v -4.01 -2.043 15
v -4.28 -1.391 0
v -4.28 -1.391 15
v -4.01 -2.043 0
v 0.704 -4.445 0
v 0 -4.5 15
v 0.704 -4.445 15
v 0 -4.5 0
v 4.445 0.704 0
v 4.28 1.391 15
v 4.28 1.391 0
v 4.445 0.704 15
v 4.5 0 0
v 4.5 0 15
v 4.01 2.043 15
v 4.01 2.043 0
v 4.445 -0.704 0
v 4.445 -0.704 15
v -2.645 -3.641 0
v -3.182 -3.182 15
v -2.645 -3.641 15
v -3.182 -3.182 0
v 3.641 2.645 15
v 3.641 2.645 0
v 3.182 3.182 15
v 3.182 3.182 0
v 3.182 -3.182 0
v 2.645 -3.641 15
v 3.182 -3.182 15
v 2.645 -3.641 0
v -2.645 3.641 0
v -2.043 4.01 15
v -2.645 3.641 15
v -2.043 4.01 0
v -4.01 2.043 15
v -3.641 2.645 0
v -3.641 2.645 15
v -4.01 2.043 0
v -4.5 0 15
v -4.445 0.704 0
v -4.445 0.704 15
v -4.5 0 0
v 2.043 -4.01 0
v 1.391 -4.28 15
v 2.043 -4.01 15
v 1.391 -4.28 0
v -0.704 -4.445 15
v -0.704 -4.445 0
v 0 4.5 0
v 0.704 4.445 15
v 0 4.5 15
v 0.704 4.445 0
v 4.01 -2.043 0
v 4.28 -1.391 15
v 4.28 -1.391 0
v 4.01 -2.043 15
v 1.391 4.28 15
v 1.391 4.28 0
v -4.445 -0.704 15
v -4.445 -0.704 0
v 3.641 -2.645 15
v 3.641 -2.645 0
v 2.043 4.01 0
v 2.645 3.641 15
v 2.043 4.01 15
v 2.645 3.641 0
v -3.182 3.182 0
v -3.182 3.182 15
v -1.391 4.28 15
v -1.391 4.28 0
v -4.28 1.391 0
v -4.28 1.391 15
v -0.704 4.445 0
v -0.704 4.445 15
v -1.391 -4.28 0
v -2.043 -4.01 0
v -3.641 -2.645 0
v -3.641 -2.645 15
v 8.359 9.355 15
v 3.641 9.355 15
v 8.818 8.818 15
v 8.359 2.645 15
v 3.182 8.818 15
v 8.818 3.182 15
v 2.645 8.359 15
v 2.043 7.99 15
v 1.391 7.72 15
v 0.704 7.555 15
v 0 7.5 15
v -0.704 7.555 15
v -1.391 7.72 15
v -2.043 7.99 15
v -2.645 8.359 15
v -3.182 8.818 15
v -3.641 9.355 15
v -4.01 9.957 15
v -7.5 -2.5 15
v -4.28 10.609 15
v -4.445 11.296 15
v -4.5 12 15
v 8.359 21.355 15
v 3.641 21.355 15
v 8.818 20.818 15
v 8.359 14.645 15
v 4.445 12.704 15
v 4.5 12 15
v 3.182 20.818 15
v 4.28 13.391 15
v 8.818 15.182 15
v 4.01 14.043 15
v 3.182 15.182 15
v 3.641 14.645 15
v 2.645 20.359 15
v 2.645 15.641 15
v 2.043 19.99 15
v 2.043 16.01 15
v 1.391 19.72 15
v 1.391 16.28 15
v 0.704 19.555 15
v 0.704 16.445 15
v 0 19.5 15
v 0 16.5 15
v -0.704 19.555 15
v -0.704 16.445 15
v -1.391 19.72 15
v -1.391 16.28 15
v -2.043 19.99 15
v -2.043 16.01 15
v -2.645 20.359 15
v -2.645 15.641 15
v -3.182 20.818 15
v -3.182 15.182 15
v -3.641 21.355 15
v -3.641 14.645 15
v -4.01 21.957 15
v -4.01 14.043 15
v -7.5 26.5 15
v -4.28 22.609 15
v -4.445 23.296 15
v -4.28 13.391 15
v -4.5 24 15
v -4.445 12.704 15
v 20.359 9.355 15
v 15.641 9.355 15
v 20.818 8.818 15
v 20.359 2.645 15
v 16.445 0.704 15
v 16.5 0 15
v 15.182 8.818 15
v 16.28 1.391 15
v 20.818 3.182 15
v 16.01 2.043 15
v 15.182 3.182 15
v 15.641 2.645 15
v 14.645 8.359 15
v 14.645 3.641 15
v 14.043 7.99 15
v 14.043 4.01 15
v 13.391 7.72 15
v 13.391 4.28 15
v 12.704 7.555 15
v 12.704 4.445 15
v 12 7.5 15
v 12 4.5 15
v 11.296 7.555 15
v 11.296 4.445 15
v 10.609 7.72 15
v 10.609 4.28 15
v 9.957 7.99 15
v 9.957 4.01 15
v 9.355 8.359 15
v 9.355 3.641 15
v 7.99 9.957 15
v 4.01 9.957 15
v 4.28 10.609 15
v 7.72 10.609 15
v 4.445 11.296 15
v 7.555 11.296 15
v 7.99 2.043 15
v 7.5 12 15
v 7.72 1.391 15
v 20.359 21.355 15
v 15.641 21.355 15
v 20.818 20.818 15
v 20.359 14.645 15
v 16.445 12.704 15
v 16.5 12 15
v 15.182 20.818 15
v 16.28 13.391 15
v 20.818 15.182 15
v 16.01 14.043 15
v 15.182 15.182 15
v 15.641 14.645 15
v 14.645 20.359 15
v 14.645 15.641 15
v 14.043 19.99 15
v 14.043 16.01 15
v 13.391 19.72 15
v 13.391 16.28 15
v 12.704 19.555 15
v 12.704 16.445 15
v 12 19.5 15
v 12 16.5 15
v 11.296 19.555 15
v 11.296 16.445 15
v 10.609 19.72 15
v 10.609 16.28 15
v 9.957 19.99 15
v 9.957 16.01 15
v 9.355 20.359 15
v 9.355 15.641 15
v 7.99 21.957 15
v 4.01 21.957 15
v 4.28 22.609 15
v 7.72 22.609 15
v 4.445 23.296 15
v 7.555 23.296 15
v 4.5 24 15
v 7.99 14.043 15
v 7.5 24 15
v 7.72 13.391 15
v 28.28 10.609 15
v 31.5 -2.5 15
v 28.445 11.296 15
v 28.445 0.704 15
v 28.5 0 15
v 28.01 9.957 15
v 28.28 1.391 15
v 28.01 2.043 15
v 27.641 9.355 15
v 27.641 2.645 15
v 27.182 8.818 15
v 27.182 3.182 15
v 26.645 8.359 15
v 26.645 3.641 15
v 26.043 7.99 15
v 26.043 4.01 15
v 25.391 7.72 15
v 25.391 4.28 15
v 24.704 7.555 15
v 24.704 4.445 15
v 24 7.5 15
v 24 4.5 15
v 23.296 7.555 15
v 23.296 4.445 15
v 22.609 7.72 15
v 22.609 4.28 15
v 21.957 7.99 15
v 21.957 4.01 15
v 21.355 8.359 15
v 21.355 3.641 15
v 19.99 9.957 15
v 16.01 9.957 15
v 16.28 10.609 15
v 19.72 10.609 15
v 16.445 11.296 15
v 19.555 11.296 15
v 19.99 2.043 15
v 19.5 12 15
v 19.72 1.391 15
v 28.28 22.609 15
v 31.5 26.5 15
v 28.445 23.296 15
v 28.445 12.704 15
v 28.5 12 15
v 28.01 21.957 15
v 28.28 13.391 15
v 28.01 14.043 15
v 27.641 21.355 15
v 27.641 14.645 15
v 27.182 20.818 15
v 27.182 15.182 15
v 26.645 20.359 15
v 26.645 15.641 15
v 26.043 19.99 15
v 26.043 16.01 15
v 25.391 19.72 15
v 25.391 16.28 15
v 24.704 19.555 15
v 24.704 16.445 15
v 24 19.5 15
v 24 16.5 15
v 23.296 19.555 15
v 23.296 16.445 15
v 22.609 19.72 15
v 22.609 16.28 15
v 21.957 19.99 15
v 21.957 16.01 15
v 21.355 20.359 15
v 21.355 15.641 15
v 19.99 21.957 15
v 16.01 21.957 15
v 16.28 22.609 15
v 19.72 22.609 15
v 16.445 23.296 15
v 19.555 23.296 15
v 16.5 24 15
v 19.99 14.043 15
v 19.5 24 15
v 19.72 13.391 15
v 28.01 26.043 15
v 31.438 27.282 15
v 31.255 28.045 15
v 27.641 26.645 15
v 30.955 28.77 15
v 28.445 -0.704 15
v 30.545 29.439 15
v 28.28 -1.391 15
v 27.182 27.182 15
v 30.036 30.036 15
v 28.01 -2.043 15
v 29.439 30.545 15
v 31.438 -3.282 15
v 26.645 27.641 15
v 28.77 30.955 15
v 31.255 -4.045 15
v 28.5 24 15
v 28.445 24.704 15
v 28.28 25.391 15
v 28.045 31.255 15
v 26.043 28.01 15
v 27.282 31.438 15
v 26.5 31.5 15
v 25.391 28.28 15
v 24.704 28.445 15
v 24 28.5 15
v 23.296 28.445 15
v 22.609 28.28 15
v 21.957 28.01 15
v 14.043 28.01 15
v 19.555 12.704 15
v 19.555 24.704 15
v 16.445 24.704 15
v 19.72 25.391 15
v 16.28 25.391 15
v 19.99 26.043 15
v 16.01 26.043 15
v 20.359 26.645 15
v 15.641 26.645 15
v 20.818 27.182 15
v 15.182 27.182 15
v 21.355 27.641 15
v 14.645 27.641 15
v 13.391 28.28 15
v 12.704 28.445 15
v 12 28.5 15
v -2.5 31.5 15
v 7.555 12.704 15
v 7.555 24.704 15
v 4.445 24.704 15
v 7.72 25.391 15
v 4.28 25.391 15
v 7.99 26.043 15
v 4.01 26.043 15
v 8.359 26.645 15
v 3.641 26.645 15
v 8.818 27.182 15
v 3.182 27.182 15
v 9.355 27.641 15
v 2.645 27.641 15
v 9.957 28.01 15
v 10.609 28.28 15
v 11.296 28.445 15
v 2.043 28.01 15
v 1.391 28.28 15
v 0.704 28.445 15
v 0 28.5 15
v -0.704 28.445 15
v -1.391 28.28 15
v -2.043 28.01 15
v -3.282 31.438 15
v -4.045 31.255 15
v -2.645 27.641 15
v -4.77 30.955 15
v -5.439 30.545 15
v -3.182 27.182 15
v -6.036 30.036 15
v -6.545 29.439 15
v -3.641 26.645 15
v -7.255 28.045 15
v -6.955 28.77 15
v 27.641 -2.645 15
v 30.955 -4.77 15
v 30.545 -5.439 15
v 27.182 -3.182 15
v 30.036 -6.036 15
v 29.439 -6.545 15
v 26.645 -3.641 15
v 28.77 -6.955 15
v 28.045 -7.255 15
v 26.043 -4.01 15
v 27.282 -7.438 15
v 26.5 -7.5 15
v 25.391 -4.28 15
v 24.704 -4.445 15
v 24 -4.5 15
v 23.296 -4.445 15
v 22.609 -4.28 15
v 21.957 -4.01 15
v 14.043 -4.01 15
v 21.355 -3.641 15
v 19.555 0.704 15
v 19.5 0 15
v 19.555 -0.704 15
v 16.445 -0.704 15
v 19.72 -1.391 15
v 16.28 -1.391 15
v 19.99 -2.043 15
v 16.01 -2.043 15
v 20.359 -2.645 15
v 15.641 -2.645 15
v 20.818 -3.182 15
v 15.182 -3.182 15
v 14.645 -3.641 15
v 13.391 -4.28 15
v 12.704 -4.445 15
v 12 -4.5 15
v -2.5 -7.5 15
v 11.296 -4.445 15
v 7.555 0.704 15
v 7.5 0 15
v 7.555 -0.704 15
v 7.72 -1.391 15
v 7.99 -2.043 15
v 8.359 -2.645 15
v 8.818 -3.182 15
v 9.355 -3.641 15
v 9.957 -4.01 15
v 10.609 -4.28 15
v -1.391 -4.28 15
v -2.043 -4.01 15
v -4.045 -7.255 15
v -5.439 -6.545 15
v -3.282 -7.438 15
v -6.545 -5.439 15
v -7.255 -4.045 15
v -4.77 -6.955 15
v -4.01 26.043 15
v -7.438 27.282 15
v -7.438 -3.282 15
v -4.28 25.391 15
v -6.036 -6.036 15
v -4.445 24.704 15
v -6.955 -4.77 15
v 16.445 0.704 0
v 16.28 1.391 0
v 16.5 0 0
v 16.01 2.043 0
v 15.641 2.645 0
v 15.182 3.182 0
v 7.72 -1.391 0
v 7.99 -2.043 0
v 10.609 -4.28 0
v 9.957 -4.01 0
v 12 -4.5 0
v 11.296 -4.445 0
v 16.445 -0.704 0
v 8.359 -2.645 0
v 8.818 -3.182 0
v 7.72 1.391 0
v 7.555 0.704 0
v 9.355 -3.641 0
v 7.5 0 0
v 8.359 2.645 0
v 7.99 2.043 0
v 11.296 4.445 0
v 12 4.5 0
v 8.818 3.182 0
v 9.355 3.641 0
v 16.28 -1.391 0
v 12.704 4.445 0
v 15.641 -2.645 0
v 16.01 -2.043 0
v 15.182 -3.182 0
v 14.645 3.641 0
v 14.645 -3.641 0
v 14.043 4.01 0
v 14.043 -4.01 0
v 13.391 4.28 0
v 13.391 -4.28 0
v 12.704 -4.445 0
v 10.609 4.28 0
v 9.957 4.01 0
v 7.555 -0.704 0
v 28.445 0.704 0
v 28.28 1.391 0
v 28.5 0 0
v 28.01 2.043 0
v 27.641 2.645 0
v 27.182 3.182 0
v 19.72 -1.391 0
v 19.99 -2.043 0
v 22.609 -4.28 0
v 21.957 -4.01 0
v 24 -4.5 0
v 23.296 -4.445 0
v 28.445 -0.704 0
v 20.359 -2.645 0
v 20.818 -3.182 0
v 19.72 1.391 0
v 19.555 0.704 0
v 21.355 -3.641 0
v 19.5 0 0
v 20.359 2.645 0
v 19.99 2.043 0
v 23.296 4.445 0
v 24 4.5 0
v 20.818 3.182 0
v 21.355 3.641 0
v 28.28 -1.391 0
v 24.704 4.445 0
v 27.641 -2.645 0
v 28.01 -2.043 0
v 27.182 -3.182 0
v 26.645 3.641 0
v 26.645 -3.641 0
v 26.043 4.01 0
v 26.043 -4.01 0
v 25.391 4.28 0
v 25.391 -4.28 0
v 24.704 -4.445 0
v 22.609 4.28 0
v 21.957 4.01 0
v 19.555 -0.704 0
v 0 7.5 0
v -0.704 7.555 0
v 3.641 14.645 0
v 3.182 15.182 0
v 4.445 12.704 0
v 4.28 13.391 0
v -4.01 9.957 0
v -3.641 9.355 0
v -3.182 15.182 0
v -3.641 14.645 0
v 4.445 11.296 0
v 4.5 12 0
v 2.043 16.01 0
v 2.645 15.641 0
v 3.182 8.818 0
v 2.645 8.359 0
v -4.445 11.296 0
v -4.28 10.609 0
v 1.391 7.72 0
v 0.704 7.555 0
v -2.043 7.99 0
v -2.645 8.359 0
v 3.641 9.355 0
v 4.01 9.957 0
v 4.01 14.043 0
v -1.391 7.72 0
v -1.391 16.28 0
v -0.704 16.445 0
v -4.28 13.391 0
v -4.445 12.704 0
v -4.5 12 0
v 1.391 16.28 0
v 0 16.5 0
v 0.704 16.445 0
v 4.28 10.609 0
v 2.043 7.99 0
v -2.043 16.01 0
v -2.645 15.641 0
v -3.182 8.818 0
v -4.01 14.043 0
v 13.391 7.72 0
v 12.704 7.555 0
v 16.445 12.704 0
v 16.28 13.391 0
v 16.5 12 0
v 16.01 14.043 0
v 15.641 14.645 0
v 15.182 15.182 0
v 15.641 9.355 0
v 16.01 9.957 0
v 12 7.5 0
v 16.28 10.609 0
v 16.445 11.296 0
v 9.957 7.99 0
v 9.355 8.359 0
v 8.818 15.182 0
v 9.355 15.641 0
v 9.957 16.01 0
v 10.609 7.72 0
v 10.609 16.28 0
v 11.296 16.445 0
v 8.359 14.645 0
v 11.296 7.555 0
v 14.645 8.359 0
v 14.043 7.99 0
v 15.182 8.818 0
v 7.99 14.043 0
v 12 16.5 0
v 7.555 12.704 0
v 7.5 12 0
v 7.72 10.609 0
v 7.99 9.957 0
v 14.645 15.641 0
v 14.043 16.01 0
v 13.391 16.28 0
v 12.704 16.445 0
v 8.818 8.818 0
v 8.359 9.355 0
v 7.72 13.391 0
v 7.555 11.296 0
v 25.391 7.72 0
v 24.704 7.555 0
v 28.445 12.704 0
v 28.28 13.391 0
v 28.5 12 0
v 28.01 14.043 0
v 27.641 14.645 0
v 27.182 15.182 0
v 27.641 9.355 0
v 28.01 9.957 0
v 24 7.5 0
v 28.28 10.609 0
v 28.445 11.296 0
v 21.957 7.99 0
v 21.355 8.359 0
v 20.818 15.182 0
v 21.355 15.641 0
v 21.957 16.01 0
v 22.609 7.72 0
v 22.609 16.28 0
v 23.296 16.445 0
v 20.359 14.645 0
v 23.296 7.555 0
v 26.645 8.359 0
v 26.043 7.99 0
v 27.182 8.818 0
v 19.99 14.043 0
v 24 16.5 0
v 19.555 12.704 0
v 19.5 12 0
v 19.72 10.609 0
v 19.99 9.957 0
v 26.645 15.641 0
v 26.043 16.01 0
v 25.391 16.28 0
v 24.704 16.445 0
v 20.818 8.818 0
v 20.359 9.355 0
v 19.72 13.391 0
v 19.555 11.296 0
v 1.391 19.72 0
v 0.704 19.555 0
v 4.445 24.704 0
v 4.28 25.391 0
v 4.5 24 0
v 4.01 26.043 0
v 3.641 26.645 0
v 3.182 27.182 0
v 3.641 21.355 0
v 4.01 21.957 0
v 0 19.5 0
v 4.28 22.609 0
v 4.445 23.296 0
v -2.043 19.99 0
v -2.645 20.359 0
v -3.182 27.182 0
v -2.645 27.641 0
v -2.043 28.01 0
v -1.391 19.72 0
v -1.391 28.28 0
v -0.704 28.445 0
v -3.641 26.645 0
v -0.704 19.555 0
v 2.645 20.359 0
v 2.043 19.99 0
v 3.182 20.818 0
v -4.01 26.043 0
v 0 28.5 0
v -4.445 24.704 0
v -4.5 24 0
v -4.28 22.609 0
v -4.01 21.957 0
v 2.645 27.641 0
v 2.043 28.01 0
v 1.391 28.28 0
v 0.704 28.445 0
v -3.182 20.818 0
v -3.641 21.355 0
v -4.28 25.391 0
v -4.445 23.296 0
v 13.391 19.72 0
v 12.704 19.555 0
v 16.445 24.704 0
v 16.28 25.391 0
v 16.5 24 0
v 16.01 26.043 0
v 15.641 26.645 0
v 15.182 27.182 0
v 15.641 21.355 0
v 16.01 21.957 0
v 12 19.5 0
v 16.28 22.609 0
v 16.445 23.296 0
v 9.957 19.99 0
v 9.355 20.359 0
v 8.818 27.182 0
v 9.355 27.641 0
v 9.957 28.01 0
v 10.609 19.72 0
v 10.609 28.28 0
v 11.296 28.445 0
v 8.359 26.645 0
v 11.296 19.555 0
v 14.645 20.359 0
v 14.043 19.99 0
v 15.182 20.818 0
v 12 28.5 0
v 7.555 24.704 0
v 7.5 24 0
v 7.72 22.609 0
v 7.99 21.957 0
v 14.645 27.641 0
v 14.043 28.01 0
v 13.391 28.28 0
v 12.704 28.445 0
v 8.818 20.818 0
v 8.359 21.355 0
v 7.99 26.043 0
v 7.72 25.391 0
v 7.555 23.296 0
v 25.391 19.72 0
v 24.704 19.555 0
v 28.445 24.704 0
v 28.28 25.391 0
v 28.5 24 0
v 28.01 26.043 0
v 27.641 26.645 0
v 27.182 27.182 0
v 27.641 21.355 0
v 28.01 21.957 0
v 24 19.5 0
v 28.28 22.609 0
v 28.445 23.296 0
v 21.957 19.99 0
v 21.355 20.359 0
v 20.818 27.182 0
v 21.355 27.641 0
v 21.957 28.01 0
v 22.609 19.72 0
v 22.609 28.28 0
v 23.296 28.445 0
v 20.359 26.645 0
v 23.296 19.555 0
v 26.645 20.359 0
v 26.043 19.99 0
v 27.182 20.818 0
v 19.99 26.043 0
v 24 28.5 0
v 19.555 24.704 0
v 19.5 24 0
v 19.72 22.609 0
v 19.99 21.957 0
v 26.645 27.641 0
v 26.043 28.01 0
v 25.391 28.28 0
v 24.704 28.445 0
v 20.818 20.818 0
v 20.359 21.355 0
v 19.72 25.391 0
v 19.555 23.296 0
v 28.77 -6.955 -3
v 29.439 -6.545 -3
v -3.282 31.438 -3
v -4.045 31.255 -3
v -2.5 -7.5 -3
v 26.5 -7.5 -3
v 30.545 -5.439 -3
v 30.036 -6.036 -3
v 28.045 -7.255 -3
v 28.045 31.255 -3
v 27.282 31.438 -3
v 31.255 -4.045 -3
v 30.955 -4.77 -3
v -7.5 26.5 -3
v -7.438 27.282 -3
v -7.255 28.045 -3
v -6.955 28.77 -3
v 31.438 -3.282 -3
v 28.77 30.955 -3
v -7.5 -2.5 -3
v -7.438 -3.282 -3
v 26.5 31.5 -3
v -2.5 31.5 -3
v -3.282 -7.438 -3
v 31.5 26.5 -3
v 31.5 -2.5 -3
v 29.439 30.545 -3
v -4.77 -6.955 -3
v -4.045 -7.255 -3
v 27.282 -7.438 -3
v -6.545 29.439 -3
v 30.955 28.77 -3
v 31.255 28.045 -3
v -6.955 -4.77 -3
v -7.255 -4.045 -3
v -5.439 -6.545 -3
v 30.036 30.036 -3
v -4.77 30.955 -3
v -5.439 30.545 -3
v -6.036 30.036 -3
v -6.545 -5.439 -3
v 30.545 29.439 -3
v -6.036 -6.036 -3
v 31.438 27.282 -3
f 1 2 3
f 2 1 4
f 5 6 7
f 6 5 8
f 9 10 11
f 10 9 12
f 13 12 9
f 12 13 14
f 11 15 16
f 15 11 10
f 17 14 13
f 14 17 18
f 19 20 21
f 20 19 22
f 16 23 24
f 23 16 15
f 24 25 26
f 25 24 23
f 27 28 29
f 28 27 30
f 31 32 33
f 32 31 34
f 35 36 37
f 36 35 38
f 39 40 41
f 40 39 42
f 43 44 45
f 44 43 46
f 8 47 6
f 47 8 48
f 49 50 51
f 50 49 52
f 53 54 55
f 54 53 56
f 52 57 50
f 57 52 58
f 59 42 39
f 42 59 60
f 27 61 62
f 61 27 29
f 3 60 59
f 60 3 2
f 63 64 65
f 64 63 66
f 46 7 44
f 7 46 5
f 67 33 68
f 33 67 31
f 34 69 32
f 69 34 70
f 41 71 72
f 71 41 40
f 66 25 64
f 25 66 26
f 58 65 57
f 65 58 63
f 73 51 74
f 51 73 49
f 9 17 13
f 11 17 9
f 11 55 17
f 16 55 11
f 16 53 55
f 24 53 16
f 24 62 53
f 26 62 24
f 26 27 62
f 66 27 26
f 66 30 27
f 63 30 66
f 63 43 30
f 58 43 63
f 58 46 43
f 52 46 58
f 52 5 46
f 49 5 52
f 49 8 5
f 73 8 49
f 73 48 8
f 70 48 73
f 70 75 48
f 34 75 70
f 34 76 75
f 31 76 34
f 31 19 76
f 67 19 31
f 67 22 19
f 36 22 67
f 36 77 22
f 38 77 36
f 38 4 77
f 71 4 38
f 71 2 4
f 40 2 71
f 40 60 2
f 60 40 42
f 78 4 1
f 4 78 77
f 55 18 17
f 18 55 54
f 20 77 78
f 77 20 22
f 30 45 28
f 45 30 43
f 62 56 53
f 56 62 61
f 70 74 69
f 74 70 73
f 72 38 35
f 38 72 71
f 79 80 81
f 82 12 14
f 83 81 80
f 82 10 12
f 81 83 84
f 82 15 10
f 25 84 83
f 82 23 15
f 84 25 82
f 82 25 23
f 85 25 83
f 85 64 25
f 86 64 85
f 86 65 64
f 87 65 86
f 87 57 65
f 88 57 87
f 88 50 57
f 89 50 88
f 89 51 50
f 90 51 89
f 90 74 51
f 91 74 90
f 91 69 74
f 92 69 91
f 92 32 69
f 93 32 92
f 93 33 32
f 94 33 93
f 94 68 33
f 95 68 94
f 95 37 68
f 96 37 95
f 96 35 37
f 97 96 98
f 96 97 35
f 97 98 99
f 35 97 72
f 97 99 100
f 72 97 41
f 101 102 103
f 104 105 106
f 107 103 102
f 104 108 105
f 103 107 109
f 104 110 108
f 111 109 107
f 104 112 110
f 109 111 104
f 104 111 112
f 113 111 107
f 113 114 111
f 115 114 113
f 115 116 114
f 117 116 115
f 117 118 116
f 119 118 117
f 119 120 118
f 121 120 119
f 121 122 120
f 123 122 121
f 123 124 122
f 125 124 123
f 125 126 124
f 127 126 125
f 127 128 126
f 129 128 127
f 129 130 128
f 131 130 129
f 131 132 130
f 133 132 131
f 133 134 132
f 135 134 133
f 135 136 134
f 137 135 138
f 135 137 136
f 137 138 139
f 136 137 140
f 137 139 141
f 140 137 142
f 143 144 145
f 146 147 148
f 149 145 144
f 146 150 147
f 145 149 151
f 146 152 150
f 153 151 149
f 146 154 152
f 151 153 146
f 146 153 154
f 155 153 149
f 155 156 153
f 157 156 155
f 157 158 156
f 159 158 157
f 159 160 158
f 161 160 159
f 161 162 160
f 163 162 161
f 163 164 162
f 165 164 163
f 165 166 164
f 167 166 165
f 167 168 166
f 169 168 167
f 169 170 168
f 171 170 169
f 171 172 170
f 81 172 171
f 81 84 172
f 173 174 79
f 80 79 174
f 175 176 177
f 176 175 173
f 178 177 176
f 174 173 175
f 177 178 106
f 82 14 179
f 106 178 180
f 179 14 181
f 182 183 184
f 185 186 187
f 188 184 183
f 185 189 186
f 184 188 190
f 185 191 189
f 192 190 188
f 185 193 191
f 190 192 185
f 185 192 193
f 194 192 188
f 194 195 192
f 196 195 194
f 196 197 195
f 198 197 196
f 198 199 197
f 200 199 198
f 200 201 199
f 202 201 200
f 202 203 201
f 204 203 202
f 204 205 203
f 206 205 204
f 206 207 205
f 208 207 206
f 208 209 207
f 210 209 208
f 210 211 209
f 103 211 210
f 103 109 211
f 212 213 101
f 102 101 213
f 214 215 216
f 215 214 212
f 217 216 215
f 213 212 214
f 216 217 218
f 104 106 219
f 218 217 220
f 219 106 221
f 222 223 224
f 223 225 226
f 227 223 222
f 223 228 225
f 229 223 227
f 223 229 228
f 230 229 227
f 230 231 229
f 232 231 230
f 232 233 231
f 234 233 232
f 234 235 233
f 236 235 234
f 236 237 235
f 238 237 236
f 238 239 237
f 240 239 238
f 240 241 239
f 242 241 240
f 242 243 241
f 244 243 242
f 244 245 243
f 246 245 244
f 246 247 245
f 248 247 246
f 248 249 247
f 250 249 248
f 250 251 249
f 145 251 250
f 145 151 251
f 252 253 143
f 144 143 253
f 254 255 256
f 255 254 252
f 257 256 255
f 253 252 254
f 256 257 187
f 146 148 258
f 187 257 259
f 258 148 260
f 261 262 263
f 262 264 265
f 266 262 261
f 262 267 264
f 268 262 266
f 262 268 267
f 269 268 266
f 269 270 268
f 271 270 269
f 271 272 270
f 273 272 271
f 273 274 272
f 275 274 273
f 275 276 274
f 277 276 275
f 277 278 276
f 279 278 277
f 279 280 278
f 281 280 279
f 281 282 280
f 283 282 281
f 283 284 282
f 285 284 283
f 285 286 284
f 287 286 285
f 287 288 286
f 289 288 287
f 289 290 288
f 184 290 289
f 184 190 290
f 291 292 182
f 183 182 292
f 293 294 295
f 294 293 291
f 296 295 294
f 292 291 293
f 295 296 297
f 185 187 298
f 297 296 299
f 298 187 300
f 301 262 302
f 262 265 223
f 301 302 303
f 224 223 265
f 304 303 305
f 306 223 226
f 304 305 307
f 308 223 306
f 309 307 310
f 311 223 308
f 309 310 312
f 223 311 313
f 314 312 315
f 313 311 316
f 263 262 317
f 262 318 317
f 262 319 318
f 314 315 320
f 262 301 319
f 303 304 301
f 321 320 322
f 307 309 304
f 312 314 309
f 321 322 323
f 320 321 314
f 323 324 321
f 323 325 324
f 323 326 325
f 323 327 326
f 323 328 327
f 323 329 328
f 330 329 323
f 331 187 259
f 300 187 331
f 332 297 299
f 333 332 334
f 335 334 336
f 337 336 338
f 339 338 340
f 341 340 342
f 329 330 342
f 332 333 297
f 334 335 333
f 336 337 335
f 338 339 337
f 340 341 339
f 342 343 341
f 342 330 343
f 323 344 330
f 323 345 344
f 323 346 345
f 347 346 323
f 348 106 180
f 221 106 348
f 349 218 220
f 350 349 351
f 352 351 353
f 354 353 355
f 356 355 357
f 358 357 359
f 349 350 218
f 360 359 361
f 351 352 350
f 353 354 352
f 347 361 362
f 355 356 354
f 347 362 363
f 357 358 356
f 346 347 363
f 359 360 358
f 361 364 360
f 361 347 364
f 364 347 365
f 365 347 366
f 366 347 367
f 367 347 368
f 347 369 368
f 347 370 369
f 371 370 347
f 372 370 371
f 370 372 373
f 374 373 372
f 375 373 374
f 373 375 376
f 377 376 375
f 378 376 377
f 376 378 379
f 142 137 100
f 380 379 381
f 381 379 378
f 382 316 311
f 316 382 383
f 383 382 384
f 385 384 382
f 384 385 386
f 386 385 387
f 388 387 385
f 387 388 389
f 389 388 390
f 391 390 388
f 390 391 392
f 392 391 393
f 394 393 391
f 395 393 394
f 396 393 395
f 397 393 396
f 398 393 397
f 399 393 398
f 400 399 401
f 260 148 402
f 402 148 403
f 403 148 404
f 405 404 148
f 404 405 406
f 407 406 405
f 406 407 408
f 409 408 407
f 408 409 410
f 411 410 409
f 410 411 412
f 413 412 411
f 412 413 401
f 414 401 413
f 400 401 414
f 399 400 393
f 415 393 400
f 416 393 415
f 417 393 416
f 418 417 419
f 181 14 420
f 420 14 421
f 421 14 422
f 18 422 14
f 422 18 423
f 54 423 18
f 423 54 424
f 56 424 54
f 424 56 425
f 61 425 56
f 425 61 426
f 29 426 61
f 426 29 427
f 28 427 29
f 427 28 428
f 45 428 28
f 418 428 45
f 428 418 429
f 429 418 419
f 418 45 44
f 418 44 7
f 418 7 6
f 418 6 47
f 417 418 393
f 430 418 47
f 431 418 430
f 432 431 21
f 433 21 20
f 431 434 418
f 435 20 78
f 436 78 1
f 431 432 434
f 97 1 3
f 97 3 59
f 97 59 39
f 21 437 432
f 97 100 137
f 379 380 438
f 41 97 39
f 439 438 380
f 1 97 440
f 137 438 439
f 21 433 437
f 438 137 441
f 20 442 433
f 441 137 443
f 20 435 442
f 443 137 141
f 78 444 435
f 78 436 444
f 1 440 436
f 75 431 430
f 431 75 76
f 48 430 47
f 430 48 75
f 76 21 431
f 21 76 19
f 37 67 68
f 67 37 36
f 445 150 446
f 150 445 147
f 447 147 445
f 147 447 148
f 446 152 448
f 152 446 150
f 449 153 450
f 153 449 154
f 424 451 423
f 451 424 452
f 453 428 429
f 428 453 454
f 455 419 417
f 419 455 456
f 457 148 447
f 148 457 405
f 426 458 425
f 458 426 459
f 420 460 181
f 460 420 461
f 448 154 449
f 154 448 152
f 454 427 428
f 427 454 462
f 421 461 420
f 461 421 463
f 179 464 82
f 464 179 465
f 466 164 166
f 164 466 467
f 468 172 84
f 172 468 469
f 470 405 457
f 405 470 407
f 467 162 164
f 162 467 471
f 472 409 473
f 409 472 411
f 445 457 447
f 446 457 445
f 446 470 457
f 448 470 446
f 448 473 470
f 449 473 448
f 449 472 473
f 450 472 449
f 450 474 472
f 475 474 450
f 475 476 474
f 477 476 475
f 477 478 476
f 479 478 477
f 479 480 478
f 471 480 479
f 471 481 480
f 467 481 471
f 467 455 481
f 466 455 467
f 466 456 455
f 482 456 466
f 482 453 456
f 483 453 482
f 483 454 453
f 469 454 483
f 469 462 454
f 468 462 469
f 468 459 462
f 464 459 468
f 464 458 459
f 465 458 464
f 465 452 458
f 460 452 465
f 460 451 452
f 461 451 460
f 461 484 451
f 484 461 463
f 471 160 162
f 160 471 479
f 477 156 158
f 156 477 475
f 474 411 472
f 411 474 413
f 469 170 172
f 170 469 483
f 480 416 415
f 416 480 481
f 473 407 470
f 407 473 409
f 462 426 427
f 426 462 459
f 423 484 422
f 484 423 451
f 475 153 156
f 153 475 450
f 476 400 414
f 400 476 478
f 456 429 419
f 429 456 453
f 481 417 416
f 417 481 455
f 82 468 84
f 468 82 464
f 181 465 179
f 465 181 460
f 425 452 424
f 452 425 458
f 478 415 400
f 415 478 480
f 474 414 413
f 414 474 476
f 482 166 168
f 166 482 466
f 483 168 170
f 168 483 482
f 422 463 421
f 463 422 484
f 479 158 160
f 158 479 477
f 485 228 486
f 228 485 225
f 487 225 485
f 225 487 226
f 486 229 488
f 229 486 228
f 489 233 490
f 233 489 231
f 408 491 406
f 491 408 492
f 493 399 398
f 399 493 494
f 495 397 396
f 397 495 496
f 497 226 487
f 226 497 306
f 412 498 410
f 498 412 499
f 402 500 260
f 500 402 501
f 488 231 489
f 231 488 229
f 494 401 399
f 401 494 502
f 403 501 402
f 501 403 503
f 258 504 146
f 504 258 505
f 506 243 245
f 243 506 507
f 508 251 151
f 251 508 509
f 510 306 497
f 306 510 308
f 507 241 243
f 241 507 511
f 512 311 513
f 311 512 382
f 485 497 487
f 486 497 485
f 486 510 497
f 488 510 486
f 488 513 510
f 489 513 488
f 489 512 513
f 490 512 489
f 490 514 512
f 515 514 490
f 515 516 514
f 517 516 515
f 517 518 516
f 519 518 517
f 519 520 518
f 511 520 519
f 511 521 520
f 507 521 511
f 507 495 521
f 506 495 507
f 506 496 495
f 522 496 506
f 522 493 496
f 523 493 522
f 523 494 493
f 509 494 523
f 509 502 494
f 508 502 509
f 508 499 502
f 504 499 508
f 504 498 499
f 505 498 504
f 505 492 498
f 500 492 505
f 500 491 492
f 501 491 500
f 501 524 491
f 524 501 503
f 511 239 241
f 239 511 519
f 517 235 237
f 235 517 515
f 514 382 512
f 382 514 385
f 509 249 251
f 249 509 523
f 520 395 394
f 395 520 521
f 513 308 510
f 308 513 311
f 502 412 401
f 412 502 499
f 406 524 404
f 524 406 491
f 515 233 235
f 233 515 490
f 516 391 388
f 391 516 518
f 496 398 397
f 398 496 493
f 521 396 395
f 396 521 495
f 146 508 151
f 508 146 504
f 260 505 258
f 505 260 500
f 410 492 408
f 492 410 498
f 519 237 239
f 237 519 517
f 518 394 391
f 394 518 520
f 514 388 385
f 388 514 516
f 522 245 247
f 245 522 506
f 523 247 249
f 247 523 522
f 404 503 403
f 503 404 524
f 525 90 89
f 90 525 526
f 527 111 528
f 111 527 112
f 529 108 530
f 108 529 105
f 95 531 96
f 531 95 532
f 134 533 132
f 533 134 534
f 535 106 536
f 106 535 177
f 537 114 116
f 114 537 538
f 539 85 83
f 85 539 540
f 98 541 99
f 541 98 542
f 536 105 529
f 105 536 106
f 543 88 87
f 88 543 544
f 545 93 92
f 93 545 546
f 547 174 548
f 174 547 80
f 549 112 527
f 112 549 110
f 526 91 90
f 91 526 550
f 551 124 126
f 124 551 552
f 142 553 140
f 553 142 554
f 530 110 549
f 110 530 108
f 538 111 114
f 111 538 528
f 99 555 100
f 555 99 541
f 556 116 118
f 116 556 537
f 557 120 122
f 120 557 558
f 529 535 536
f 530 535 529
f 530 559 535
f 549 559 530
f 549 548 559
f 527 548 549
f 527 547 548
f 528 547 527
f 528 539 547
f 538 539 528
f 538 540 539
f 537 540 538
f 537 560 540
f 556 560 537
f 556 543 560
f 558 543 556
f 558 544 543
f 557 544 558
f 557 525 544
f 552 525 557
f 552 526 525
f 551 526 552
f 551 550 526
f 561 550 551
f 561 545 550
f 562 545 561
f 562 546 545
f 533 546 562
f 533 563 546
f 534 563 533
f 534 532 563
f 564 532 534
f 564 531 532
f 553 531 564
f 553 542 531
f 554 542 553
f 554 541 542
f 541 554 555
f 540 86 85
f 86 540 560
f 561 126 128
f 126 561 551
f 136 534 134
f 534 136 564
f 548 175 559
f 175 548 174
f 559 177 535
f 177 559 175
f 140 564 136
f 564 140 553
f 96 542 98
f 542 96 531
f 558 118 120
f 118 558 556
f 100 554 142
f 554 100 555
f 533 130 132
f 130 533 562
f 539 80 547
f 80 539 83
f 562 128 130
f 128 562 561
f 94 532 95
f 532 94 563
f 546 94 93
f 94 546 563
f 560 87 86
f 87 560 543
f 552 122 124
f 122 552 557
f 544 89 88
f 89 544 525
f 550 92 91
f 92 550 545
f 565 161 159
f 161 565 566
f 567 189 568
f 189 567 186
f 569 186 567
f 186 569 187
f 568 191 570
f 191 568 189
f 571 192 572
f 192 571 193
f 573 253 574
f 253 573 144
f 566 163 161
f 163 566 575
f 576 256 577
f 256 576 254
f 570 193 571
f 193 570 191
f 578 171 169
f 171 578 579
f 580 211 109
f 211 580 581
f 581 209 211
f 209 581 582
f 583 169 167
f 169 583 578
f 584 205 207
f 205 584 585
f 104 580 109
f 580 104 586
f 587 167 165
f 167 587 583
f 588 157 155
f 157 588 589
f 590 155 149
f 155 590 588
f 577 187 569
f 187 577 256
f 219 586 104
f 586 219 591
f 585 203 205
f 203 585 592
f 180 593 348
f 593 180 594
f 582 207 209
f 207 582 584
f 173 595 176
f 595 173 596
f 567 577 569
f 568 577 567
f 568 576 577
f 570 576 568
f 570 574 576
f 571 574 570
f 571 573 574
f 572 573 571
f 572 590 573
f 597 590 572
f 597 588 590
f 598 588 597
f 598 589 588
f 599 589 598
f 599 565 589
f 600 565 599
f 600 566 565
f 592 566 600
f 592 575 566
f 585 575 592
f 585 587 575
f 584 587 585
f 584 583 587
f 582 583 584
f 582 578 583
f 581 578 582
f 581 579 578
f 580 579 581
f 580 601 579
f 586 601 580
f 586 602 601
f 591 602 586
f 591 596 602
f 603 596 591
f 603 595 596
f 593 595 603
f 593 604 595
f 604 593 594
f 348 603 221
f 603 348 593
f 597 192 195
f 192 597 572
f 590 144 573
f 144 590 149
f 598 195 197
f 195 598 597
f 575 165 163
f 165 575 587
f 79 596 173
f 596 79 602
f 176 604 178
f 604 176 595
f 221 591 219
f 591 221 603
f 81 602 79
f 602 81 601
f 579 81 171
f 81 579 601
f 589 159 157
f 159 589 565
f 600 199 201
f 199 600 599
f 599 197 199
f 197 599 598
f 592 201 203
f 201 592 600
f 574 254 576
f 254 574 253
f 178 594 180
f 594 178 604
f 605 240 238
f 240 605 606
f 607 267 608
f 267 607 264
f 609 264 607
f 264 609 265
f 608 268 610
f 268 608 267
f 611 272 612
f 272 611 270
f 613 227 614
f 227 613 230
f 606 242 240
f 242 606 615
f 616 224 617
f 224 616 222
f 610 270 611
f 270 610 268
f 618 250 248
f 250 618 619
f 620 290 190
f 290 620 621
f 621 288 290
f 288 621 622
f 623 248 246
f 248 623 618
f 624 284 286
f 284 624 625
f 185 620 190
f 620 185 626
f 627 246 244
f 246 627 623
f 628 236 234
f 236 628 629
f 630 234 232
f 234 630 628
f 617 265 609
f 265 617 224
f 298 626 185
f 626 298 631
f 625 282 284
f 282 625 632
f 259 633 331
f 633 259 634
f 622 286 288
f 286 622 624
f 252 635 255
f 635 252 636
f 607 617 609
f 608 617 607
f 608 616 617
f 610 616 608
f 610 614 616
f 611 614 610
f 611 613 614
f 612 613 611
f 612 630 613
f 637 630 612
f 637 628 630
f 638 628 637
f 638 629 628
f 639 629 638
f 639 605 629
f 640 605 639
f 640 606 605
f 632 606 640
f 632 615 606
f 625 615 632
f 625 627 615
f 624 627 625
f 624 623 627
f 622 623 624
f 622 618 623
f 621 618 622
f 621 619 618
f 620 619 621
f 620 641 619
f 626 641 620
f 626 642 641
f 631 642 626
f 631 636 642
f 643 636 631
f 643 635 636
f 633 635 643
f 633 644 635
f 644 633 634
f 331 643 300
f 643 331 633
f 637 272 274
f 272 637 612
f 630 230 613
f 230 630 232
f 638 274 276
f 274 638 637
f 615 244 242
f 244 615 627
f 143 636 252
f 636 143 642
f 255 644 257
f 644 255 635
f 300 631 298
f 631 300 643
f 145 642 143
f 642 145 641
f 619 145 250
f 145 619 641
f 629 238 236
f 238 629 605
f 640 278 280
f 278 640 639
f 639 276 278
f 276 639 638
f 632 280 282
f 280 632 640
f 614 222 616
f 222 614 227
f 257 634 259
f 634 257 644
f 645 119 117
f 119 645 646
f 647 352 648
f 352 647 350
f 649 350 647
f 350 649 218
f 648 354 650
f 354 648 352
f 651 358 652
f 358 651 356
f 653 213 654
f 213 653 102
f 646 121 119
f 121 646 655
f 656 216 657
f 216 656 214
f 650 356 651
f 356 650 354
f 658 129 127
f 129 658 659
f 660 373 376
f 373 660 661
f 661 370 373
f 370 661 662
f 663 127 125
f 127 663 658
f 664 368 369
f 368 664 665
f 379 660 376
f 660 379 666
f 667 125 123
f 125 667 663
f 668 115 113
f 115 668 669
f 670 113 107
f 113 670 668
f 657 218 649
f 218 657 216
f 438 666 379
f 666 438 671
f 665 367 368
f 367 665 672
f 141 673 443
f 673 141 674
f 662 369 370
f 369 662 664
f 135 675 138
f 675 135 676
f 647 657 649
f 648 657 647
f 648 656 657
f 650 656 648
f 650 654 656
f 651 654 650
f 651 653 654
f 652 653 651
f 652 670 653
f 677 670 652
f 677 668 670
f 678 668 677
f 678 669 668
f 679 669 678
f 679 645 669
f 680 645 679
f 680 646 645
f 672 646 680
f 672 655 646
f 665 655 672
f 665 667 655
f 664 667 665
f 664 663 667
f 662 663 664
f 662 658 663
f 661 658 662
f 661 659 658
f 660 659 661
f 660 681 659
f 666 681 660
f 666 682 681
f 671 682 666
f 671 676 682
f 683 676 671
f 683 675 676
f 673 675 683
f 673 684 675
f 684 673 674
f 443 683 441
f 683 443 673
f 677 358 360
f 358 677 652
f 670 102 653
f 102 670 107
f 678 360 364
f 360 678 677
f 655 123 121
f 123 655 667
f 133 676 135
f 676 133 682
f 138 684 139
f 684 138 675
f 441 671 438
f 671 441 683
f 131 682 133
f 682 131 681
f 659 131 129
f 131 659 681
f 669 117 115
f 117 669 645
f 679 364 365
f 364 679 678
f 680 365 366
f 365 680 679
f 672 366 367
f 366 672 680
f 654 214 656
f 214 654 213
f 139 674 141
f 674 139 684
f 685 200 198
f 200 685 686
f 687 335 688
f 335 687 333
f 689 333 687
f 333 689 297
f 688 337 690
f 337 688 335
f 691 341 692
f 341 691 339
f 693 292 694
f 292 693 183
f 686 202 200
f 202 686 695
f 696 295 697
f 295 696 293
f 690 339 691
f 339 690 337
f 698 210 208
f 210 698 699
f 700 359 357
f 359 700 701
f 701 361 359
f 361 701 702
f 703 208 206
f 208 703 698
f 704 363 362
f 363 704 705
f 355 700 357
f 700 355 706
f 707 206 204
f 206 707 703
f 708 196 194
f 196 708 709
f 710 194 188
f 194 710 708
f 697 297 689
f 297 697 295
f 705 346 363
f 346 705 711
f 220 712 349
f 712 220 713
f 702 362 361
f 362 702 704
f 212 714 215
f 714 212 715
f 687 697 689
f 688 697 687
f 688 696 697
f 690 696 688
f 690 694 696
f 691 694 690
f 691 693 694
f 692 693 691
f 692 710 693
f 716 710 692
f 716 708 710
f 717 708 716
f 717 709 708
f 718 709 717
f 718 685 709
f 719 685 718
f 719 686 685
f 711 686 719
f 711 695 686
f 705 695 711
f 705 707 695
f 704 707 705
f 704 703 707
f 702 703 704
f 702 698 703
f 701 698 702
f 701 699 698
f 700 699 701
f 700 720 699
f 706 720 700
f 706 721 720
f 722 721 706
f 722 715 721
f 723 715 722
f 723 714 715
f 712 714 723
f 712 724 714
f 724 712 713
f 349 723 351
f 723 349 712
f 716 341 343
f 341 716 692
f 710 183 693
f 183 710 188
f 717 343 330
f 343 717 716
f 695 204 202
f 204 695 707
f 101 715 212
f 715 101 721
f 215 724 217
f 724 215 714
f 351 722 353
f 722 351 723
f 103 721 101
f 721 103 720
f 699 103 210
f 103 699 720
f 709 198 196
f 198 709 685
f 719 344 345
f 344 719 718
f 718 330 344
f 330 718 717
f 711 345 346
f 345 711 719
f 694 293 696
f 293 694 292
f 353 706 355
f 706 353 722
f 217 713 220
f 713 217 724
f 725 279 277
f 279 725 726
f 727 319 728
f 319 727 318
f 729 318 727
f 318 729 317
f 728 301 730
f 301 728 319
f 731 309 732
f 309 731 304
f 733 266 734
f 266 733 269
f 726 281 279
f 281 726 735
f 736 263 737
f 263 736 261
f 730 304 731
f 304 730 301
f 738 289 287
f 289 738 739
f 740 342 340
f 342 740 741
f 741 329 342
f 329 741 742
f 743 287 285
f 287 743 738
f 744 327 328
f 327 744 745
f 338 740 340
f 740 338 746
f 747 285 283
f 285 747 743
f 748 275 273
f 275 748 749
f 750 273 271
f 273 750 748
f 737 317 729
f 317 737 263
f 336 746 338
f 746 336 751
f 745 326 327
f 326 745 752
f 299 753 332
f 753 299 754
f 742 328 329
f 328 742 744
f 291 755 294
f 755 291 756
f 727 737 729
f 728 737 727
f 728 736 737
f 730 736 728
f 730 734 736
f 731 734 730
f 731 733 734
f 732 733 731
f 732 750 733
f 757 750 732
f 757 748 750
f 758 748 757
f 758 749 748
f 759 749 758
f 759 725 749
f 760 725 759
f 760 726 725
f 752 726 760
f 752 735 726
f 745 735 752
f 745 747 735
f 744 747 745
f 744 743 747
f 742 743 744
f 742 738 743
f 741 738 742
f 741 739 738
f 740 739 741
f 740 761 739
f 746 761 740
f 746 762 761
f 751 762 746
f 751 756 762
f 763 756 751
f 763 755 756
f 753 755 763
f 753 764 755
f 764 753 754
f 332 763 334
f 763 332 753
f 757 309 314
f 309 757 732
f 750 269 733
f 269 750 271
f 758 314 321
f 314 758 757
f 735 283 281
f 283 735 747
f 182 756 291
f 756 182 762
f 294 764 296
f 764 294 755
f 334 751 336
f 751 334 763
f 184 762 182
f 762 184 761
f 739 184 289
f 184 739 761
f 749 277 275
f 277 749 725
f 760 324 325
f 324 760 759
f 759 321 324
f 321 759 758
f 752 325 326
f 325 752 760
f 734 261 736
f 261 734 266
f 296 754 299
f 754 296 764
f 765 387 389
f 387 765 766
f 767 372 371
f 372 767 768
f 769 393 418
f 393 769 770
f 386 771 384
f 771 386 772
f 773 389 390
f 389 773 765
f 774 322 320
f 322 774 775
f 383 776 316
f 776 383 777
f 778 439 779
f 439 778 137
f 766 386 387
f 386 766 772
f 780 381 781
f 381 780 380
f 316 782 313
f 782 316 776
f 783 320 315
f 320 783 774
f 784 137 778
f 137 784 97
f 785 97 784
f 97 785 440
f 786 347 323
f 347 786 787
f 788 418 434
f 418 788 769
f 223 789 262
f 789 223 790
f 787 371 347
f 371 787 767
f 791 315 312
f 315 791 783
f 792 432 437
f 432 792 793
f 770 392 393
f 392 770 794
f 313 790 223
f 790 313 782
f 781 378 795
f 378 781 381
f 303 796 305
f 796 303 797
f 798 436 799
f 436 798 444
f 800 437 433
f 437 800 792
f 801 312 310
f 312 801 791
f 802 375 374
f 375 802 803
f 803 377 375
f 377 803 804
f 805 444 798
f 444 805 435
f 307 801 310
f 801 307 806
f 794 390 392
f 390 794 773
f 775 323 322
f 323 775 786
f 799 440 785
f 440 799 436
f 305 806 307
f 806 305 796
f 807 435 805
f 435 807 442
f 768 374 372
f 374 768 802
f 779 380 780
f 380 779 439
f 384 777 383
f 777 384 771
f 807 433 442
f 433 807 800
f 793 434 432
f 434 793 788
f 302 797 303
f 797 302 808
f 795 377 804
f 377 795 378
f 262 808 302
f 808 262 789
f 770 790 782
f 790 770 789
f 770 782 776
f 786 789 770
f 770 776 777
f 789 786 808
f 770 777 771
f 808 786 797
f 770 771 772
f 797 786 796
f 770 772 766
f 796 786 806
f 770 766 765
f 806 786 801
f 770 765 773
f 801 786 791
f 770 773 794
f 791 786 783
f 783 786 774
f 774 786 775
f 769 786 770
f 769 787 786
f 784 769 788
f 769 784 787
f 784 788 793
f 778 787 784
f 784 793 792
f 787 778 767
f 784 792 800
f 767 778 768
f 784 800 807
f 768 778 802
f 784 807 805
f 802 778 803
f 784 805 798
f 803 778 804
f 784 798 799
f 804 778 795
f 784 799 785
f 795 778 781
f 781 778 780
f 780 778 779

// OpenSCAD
/*
Solder Tip Holder (c) by Jorge Monteiro

Solder Tip Holder is licensed under a
Creative Commons Attribution-ShareAlike 4.0 International.

You should have received a copy of the license along with this
work.  If not, see <http://creativecommons.org/licenses/by-sa/4.0/>.
*/

/* [Basics] */
// Space between tips in mm
tipGap = 3;
// Diameter of tip in mm
tipSize = 9;
// Number of tips you want to store per row
tipsPerRow = 3;
// Number of tips you want to store per column
tipsPerColumn = 3;
// Height of the tip box in mm
height = 18;
// Base of the box in mm
baseHeight = 3;

/* [Ignore] */
$fn=40*1;
tipDim = tipSize/2;
width = tipsPerRow * (tipGap + tipSize) + tipGap;
length = tipsPerColumn * (tipGap + tipSize) + tipGap;
tipHeight = height - baseHeight;

difference() {
    
    translate([length/2-(tipGap+tipDim), width/2-(tipGap+tipDim), -3]) roundedCube(length, width, height, 5);
    drawTipHolders();
};

module drawTipHolders() {
     for(row = [0 : 1 : tipsPerRow-1]) {
         for(column = [0 : 1 : tipsPerColumn-1]) {
            translate([(tipGap+tipDim*2)*column, (tipGap+tipDim*2)*row]) cylinder(tipHeight, tipDim, tipDim);
         }
     }

}

module roundedCube(xdim, ydim, zdim, rdim) {
    translate([-xdim/2,-ydim/2,0]){
        hull(){
            translate([rdim,rdim,0]) cylinder(r=rdim, h=zdim);
            translate([xdim-rdim,rdim,0]) cylinder(r=rdim, h=zdim);

            translate([rdim,ydim-rdim,0]) cylinder(r=rdim, h=zdim);
            translate([xdim-rdim,ydim-rdim,0]) cylinder(r=rdim, h=zdim);

        };
    };
};
